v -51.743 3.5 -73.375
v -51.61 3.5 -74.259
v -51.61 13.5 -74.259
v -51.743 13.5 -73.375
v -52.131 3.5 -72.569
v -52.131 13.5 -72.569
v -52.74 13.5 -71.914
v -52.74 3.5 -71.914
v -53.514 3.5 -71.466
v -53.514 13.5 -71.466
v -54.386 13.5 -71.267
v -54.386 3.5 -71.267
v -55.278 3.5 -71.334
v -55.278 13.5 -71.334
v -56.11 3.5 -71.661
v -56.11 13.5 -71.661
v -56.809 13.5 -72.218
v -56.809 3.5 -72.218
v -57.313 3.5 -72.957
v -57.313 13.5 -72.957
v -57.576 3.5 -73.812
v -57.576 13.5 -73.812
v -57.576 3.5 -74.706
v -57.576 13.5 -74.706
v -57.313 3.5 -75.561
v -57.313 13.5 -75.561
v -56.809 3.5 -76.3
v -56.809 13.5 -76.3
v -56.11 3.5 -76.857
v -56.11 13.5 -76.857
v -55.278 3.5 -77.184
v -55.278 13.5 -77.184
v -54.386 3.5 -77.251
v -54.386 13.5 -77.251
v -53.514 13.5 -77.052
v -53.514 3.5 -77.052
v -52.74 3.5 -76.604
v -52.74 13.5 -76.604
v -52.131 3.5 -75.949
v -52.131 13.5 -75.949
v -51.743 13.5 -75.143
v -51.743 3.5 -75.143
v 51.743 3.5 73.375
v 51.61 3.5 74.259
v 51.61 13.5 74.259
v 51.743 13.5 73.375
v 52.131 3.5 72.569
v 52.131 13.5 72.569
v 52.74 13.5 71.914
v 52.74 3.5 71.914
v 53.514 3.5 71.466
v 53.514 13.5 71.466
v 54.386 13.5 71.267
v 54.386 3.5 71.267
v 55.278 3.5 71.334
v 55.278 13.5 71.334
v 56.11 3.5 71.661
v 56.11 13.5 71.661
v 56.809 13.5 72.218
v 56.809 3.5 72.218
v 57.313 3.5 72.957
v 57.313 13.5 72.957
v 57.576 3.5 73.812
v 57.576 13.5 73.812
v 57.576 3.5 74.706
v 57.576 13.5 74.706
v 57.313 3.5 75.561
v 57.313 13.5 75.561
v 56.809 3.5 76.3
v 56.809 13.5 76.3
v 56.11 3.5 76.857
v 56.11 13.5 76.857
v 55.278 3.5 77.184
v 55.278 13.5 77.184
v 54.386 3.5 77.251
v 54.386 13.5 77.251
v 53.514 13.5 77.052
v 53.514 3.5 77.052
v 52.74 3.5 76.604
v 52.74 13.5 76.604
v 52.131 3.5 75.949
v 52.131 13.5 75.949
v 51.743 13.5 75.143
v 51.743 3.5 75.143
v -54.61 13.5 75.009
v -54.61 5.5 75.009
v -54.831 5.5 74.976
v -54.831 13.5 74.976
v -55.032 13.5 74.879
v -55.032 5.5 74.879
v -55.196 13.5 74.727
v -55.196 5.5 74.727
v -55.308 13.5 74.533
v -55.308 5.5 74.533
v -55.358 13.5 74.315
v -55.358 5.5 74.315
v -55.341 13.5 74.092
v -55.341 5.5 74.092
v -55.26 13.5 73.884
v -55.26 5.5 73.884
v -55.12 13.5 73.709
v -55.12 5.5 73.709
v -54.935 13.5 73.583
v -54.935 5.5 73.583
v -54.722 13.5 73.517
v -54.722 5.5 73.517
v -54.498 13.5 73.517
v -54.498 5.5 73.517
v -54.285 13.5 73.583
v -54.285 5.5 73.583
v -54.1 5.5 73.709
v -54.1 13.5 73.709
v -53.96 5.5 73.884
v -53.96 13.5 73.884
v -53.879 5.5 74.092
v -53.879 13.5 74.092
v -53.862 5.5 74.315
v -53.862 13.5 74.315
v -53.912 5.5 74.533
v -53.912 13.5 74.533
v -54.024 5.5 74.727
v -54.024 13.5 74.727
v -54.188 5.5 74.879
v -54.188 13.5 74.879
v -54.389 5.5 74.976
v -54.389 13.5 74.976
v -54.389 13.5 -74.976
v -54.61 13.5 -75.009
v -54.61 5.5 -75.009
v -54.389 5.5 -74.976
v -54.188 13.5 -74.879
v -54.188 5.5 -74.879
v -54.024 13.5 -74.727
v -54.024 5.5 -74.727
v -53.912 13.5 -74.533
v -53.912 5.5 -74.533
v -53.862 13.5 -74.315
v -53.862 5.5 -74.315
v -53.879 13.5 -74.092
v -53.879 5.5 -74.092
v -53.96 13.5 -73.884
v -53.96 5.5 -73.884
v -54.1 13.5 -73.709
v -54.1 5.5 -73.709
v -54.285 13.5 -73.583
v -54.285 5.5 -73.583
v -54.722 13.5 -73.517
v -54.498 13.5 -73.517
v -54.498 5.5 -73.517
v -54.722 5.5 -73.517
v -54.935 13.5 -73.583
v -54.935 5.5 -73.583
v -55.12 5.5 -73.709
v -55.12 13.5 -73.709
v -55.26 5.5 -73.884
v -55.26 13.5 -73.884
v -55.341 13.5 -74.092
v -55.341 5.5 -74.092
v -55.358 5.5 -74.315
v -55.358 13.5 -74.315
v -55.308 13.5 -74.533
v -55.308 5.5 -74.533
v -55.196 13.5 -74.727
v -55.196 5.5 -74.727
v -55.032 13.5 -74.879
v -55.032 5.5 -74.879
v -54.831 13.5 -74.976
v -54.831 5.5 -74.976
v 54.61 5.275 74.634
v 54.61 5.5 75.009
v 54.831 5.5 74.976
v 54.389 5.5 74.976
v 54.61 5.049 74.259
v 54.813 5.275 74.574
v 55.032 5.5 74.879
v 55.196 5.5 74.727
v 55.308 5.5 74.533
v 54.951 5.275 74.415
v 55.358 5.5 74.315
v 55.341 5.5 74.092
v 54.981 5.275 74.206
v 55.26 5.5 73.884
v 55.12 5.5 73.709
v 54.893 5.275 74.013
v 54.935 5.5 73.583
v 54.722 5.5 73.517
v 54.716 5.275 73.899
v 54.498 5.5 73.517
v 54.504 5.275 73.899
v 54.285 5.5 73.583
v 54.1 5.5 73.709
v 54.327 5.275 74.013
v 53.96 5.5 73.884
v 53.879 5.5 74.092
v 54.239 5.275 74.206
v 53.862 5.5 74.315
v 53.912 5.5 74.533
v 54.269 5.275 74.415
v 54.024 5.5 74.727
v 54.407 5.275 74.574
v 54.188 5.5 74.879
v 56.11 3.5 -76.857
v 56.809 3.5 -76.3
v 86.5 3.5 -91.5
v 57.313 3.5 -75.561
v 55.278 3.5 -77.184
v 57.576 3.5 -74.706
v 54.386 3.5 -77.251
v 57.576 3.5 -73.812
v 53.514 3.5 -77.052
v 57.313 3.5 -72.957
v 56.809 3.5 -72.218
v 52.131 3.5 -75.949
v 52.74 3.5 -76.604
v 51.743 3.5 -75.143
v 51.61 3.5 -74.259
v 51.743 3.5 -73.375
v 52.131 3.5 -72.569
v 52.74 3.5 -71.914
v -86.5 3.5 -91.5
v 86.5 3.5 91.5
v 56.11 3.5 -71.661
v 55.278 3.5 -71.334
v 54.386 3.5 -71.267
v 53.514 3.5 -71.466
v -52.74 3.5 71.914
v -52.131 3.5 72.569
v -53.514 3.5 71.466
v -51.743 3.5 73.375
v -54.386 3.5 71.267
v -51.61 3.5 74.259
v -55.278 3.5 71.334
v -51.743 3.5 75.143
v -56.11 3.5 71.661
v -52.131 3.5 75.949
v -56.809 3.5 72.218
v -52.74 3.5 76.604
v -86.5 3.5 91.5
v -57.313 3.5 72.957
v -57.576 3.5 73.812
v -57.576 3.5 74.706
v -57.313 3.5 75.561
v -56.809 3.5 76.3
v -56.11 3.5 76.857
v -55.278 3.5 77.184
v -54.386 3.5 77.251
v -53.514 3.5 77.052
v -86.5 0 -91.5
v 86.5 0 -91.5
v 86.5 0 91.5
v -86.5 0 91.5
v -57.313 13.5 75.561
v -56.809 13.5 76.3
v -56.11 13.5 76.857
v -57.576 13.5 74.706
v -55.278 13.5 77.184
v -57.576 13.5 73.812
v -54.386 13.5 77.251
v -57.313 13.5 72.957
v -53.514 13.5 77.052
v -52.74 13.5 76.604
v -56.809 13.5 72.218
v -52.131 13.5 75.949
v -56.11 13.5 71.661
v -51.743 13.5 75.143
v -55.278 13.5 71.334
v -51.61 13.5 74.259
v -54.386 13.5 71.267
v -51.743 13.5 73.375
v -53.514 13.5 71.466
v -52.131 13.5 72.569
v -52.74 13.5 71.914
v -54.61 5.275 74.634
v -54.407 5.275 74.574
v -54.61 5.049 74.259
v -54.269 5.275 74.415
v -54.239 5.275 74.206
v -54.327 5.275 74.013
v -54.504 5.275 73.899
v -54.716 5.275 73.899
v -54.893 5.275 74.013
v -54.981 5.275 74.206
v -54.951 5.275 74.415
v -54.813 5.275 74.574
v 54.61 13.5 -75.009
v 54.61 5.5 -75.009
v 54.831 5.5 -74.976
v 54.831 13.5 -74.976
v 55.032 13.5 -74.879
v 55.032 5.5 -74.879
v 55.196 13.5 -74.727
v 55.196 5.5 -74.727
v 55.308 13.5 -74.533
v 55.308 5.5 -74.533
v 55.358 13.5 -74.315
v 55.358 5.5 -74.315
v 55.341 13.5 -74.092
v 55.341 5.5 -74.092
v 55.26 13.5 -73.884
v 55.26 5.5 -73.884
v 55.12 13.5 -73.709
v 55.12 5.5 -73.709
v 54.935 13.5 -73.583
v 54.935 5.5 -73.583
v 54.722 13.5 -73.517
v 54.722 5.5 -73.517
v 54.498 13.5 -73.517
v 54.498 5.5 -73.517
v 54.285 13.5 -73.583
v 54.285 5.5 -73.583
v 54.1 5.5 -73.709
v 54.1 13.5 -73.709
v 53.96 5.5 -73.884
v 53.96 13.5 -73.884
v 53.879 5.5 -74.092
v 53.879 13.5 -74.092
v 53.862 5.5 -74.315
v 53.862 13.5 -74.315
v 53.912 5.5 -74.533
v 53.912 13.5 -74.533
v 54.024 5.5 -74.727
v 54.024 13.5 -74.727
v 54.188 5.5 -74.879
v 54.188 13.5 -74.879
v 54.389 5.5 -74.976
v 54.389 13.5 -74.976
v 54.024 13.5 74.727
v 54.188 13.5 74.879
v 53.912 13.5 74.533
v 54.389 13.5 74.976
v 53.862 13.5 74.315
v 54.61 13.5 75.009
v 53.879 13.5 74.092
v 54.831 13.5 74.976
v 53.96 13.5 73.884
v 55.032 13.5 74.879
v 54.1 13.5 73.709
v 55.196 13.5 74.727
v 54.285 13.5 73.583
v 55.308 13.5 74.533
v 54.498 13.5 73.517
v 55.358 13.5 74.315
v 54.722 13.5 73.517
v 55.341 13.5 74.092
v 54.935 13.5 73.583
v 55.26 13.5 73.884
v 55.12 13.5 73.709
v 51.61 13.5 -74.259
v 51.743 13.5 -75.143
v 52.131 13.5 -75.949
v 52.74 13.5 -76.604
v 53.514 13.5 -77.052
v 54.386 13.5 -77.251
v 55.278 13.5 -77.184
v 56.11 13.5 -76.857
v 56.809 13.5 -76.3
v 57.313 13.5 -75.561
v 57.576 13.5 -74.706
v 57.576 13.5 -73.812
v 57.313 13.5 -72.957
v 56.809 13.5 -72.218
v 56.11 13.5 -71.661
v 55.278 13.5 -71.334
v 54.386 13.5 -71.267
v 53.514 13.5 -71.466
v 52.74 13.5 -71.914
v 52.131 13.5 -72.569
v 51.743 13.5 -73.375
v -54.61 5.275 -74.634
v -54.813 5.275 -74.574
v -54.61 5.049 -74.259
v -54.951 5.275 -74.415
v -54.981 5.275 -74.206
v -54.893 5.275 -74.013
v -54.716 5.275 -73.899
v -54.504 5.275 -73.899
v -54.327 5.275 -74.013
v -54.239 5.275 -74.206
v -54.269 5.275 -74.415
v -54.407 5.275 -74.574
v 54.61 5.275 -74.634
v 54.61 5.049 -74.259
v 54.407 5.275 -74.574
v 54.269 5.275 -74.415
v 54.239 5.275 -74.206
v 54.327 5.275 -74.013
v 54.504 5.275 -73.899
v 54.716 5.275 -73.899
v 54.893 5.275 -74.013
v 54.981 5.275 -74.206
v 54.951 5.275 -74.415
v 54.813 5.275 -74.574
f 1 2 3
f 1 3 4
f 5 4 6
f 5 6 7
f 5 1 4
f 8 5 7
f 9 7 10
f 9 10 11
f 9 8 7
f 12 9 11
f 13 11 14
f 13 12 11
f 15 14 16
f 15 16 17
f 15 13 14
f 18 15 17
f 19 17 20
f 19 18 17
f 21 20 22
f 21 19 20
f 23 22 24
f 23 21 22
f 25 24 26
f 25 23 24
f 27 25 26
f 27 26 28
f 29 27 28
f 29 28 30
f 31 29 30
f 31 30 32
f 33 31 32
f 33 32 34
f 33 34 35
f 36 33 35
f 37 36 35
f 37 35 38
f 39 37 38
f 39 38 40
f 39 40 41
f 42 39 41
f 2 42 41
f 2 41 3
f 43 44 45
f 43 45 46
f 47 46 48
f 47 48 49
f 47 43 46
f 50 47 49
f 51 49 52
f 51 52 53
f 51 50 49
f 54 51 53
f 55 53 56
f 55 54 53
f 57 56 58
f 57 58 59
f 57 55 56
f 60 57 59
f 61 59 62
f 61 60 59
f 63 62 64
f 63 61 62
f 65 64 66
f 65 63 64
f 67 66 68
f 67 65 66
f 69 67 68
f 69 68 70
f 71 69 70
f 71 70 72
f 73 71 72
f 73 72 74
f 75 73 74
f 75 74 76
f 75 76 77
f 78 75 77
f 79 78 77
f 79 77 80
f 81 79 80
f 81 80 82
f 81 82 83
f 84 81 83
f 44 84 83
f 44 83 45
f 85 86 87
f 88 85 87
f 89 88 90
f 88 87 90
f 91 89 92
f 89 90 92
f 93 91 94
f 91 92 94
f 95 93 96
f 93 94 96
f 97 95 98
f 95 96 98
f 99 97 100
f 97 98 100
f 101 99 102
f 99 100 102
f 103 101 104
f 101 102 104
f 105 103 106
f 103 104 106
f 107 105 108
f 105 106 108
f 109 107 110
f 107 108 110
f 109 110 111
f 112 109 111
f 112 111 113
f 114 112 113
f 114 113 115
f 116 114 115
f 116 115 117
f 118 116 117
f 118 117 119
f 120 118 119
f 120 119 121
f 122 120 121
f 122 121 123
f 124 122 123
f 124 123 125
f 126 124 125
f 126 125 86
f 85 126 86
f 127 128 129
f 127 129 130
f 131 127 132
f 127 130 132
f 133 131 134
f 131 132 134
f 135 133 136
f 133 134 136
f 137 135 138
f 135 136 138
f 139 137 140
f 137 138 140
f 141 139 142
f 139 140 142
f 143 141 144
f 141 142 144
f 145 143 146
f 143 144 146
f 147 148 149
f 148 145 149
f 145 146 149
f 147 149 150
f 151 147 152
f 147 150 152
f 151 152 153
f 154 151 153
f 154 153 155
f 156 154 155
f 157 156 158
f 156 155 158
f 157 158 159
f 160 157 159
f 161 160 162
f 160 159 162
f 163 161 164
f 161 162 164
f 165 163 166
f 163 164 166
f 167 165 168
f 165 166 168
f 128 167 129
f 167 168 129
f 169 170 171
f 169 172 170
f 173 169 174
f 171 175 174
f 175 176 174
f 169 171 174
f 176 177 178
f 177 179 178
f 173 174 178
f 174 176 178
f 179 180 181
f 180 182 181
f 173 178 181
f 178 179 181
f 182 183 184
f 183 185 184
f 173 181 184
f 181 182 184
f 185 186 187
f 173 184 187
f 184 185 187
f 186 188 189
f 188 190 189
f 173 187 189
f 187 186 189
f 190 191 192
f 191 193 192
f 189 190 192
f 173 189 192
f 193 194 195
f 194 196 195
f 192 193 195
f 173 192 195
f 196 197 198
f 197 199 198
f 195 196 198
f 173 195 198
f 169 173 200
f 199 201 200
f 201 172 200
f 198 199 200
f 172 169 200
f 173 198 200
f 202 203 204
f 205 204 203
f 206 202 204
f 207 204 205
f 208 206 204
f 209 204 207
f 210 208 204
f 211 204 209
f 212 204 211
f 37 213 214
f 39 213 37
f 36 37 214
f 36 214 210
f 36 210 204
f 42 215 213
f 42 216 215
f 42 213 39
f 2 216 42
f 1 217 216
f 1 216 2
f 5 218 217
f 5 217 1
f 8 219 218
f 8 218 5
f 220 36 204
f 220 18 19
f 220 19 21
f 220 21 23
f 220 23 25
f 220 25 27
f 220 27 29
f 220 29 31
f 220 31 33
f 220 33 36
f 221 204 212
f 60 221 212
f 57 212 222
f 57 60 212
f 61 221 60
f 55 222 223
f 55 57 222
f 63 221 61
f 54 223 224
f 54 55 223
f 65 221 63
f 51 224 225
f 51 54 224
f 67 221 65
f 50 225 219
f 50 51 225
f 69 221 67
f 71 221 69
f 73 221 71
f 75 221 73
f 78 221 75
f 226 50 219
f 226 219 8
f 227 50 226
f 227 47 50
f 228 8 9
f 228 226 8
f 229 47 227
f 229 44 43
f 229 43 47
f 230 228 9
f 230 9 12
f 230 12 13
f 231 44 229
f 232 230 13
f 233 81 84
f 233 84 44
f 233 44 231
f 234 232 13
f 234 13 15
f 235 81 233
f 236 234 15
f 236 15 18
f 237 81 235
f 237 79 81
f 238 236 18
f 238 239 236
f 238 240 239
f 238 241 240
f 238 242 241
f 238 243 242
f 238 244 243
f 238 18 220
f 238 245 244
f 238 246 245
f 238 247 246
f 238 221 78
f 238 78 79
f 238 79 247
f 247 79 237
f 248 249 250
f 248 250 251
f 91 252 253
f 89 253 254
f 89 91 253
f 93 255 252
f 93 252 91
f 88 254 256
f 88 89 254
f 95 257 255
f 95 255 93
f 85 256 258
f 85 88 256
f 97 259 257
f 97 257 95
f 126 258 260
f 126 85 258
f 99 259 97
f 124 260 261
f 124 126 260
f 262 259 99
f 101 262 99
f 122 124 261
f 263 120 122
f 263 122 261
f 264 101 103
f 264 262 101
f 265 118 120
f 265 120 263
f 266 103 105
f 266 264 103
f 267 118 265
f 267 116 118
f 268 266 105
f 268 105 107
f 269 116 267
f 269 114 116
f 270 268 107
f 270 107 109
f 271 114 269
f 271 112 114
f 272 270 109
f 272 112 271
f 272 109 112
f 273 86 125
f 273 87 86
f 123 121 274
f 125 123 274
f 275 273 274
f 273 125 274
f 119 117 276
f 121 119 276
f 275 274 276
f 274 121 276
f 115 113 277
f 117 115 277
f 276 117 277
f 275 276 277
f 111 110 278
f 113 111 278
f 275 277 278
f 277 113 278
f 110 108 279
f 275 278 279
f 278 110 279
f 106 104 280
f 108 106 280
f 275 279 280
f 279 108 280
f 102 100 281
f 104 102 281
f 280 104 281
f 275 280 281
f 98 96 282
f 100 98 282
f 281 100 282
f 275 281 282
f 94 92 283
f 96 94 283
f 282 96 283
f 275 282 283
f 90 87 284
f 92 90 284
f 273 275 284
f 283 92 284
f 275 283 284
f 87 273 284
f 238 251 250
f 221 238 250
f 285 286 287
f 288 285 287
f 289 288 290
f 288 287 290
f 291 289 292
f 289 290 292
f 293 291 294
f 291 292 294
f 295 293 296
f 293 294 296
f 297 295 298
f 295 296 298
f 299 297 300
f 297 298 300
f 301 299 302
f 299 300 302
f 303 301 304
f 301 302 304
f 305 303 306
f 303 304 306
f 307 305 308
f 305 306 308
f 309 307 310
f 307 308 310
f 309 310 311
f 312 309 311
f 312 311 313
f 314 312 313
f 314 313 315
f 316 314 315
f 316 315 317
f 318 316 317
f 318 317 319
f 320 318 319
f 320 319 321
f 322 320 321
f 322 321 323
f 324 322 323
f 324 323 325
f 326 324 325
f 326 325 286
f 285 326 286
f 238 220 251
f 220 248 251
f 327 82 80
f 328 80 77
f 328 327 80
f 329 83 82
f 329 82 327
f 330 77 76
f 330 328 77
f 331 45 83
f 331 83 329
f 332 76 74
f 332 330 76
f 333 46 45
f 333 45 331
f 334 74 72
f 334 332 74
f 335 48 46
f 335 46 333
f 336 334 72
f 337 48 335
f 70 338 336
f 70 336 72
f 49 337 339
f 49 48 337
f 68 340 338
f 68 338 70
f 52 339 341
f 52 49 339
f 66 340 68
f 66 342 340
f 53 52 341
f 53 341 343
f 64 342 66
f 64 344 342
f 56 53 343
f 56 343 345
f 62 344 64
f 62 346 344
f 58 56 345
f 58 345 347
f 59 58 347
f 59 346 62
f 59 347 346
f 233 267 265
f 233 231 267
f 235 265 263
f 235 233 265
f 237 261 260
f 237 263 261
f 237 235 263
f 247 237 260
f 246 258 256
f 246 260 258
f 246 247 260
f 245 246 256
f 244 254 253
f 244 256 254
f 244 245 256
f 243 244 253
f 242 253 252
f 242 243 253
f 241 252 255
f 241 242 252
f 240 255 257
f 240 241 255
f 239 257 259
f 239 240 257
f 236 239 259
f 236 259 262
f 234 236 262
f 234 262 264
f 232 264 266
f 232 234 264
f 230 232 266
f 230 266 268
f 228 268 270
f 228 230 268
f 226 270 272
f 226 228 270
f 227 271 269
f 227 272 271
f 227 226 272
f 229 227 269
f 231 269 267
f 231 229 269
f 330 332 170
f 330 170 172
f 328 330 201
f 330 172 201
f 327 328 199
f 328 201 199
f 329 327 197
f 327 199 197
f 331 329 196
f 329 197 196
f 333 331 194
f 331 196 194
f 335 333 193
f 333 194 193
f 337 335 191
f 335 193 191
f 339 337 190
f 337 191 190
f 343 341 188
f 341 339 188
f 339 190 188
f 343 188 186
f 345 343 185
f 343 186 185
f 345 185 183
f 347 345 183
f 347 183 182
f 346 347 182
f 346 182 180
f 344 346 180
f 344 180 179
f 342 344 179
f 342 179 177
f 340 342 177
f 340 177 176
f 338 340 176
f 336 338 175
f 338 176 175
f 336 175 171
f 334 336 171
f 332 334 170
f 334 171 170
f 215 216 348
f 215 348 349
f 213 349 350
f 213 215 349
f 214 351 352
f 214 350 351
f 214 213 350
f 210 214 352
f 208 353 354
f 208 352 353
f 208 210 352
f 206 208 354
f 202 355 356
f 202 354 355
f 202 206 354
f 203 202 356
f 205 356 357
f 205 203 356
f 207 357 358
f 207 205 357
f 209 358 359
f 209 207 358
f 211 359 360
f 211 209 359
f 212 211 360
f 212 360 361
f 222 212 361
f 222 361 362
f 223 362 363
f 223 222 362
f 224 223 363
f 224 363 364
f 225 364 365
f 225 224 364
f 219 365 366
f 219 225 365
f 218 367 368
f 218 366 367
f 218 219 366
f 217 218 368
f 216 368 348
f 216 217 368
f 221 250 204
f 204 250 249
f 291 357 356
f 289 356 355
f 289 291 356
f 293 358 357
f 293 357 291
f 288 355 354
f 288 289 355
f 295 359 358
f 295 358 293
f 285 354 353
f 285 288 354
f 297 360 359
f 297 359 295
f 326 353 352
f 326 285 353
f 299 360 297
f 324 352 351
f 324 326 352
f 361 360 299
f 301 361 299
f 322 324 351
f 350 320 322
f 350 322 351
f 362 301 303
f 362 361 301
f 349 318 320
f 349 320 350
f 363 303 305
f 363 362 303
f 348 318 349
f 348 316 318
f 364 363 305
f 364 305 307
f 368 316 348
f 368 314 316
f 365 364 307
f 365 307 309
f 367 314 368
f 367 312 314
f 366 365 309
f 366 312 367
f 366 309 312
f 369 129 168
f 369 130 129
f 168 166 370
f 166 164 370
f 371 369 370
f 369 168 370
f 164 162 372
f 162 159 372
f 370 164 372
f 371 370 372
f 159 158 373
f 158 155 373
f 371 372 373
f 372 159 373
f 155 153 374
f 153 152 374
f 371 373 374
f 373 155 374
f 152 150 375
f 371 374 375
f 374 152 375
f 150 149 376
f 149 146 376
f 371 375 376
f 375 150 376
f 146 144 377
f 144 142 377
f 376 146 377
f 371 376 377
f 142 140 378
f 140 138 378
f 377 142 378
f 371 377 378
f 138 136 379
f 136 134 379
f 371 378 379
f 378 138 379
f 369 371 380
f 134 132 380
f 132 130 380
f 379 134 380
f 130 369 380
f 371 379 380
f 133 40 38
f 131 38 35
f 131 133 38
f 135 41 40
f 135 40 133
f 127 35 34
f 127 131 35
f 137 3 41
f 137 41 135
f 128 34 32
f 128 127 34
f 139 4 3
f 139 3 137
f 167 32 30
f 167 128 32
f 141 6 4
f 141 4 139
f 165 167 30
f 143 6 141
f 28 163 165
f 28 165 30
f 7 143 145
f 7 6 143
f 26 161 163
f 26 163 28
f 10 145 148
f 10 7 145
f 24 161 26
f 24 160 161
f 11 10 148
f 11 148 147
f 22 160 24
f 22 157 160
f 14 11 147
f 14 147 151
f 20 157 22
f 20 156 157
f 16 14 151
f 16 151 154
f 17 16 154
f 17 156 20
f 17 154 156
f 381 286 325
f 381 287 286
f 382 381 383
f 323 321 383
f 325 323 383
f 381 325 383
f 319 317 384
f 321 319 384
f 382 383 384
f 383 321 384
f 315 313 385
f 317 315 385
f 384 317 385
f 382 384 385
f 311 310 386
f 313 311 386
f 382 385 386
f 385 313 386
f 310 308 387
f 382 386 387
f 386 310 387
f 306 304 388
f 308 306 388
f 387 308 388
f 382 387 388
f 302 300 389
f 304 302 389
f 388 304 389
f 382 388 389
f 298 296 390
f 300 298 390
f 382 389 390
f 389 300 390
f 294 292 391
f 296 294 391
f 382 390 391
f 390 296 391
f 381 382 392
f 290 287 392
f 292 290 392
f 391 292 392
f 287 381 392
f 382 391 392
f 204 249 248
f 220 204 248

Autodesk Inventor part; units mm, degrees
sketch "Náčrt1" plane through (0, 0, 0) normal (0, 1, 0) x (-1, 0, 0)
  line L0 (86.5, 91.5) -> (-86.5, 91.5)
  line L1 (-86.5, 91.5) -> (-86.5, -91.5)
  line L2 (-86.5, -91.5) -> (86.5, -91.5)
  line L3 (86.5, -91.5) -> (86.5, 91.5)
  line L4 (121.1, 0) -> (-121.1, 0) projected
  line L5 (0, -128.1) -> (0, 128.1) projected
  point P0 (0, 0)
  dimension "d0" = 183
  dimension "d1" = 173
extrude "Vysunutí1" add sketch "Náčrt1" along normal blind 3.5
sketch "Náčrt2" plane through (0, 3.5, 0) normal (0, 1, 0) x (1, 0, 0)
  circle A0 centre (-54.61, -74.259) radius 3
  line L0 (0, 128.1) -> (0, -128.1) projected
  line L1 (-121.1, 0) -> (121.1, 0) projected
  point P0 (0, 0)
  dimension "d4" = 6
  dimension "d14" = 54.61
  dimension "d15" = 74.259
extrude "Vysunutí2" add sketch "Náčrt2" along normal blind 10
ref_plane "Pracovní rovina1" through (0, 0, 91.5) normal (1, 0, 0) x (0, 0, -1)
ref_plane "Pracovní rovina2" through (-86.5, 0, 0) normal (0, 0, 1) x (1, 0, 0)
sketch "Náčrt3" plane through (-54.61, 13.5, 74.259) normal (0, 1, 0) x (1, 0, 0)
  point P0 (54.61, 74.259)
  point P1 (0, 0)
  point P2 (0, 0)
hole "Díra1" at (-54.61, 13.5, 74.259) direction (0, -1, 0) diameter 1.5 depth 8 tip angle 118
pattern_circular "Kruhové pole1" count 2 over 360 about axis through (0, -10, 0) along (0, 1, 0) of "Vysunutí2", "Díra1"
mirror "Zrcadlit1" about plane through (0, 0, 0) normal (0, 0, 1) of "Vysunutí2", "Díra1", "Kruhové pole1"
ref_plane "Pracovní rovina5" through (0, 1.75, 0) normal (0, 1, 0) x (1, 0, 0)
ref_plane "Pracovní rovina3" through (0, 0, 0) normal (0, 0, 1) x (1, 0, 0)
properties part number "Cabinet - back"
